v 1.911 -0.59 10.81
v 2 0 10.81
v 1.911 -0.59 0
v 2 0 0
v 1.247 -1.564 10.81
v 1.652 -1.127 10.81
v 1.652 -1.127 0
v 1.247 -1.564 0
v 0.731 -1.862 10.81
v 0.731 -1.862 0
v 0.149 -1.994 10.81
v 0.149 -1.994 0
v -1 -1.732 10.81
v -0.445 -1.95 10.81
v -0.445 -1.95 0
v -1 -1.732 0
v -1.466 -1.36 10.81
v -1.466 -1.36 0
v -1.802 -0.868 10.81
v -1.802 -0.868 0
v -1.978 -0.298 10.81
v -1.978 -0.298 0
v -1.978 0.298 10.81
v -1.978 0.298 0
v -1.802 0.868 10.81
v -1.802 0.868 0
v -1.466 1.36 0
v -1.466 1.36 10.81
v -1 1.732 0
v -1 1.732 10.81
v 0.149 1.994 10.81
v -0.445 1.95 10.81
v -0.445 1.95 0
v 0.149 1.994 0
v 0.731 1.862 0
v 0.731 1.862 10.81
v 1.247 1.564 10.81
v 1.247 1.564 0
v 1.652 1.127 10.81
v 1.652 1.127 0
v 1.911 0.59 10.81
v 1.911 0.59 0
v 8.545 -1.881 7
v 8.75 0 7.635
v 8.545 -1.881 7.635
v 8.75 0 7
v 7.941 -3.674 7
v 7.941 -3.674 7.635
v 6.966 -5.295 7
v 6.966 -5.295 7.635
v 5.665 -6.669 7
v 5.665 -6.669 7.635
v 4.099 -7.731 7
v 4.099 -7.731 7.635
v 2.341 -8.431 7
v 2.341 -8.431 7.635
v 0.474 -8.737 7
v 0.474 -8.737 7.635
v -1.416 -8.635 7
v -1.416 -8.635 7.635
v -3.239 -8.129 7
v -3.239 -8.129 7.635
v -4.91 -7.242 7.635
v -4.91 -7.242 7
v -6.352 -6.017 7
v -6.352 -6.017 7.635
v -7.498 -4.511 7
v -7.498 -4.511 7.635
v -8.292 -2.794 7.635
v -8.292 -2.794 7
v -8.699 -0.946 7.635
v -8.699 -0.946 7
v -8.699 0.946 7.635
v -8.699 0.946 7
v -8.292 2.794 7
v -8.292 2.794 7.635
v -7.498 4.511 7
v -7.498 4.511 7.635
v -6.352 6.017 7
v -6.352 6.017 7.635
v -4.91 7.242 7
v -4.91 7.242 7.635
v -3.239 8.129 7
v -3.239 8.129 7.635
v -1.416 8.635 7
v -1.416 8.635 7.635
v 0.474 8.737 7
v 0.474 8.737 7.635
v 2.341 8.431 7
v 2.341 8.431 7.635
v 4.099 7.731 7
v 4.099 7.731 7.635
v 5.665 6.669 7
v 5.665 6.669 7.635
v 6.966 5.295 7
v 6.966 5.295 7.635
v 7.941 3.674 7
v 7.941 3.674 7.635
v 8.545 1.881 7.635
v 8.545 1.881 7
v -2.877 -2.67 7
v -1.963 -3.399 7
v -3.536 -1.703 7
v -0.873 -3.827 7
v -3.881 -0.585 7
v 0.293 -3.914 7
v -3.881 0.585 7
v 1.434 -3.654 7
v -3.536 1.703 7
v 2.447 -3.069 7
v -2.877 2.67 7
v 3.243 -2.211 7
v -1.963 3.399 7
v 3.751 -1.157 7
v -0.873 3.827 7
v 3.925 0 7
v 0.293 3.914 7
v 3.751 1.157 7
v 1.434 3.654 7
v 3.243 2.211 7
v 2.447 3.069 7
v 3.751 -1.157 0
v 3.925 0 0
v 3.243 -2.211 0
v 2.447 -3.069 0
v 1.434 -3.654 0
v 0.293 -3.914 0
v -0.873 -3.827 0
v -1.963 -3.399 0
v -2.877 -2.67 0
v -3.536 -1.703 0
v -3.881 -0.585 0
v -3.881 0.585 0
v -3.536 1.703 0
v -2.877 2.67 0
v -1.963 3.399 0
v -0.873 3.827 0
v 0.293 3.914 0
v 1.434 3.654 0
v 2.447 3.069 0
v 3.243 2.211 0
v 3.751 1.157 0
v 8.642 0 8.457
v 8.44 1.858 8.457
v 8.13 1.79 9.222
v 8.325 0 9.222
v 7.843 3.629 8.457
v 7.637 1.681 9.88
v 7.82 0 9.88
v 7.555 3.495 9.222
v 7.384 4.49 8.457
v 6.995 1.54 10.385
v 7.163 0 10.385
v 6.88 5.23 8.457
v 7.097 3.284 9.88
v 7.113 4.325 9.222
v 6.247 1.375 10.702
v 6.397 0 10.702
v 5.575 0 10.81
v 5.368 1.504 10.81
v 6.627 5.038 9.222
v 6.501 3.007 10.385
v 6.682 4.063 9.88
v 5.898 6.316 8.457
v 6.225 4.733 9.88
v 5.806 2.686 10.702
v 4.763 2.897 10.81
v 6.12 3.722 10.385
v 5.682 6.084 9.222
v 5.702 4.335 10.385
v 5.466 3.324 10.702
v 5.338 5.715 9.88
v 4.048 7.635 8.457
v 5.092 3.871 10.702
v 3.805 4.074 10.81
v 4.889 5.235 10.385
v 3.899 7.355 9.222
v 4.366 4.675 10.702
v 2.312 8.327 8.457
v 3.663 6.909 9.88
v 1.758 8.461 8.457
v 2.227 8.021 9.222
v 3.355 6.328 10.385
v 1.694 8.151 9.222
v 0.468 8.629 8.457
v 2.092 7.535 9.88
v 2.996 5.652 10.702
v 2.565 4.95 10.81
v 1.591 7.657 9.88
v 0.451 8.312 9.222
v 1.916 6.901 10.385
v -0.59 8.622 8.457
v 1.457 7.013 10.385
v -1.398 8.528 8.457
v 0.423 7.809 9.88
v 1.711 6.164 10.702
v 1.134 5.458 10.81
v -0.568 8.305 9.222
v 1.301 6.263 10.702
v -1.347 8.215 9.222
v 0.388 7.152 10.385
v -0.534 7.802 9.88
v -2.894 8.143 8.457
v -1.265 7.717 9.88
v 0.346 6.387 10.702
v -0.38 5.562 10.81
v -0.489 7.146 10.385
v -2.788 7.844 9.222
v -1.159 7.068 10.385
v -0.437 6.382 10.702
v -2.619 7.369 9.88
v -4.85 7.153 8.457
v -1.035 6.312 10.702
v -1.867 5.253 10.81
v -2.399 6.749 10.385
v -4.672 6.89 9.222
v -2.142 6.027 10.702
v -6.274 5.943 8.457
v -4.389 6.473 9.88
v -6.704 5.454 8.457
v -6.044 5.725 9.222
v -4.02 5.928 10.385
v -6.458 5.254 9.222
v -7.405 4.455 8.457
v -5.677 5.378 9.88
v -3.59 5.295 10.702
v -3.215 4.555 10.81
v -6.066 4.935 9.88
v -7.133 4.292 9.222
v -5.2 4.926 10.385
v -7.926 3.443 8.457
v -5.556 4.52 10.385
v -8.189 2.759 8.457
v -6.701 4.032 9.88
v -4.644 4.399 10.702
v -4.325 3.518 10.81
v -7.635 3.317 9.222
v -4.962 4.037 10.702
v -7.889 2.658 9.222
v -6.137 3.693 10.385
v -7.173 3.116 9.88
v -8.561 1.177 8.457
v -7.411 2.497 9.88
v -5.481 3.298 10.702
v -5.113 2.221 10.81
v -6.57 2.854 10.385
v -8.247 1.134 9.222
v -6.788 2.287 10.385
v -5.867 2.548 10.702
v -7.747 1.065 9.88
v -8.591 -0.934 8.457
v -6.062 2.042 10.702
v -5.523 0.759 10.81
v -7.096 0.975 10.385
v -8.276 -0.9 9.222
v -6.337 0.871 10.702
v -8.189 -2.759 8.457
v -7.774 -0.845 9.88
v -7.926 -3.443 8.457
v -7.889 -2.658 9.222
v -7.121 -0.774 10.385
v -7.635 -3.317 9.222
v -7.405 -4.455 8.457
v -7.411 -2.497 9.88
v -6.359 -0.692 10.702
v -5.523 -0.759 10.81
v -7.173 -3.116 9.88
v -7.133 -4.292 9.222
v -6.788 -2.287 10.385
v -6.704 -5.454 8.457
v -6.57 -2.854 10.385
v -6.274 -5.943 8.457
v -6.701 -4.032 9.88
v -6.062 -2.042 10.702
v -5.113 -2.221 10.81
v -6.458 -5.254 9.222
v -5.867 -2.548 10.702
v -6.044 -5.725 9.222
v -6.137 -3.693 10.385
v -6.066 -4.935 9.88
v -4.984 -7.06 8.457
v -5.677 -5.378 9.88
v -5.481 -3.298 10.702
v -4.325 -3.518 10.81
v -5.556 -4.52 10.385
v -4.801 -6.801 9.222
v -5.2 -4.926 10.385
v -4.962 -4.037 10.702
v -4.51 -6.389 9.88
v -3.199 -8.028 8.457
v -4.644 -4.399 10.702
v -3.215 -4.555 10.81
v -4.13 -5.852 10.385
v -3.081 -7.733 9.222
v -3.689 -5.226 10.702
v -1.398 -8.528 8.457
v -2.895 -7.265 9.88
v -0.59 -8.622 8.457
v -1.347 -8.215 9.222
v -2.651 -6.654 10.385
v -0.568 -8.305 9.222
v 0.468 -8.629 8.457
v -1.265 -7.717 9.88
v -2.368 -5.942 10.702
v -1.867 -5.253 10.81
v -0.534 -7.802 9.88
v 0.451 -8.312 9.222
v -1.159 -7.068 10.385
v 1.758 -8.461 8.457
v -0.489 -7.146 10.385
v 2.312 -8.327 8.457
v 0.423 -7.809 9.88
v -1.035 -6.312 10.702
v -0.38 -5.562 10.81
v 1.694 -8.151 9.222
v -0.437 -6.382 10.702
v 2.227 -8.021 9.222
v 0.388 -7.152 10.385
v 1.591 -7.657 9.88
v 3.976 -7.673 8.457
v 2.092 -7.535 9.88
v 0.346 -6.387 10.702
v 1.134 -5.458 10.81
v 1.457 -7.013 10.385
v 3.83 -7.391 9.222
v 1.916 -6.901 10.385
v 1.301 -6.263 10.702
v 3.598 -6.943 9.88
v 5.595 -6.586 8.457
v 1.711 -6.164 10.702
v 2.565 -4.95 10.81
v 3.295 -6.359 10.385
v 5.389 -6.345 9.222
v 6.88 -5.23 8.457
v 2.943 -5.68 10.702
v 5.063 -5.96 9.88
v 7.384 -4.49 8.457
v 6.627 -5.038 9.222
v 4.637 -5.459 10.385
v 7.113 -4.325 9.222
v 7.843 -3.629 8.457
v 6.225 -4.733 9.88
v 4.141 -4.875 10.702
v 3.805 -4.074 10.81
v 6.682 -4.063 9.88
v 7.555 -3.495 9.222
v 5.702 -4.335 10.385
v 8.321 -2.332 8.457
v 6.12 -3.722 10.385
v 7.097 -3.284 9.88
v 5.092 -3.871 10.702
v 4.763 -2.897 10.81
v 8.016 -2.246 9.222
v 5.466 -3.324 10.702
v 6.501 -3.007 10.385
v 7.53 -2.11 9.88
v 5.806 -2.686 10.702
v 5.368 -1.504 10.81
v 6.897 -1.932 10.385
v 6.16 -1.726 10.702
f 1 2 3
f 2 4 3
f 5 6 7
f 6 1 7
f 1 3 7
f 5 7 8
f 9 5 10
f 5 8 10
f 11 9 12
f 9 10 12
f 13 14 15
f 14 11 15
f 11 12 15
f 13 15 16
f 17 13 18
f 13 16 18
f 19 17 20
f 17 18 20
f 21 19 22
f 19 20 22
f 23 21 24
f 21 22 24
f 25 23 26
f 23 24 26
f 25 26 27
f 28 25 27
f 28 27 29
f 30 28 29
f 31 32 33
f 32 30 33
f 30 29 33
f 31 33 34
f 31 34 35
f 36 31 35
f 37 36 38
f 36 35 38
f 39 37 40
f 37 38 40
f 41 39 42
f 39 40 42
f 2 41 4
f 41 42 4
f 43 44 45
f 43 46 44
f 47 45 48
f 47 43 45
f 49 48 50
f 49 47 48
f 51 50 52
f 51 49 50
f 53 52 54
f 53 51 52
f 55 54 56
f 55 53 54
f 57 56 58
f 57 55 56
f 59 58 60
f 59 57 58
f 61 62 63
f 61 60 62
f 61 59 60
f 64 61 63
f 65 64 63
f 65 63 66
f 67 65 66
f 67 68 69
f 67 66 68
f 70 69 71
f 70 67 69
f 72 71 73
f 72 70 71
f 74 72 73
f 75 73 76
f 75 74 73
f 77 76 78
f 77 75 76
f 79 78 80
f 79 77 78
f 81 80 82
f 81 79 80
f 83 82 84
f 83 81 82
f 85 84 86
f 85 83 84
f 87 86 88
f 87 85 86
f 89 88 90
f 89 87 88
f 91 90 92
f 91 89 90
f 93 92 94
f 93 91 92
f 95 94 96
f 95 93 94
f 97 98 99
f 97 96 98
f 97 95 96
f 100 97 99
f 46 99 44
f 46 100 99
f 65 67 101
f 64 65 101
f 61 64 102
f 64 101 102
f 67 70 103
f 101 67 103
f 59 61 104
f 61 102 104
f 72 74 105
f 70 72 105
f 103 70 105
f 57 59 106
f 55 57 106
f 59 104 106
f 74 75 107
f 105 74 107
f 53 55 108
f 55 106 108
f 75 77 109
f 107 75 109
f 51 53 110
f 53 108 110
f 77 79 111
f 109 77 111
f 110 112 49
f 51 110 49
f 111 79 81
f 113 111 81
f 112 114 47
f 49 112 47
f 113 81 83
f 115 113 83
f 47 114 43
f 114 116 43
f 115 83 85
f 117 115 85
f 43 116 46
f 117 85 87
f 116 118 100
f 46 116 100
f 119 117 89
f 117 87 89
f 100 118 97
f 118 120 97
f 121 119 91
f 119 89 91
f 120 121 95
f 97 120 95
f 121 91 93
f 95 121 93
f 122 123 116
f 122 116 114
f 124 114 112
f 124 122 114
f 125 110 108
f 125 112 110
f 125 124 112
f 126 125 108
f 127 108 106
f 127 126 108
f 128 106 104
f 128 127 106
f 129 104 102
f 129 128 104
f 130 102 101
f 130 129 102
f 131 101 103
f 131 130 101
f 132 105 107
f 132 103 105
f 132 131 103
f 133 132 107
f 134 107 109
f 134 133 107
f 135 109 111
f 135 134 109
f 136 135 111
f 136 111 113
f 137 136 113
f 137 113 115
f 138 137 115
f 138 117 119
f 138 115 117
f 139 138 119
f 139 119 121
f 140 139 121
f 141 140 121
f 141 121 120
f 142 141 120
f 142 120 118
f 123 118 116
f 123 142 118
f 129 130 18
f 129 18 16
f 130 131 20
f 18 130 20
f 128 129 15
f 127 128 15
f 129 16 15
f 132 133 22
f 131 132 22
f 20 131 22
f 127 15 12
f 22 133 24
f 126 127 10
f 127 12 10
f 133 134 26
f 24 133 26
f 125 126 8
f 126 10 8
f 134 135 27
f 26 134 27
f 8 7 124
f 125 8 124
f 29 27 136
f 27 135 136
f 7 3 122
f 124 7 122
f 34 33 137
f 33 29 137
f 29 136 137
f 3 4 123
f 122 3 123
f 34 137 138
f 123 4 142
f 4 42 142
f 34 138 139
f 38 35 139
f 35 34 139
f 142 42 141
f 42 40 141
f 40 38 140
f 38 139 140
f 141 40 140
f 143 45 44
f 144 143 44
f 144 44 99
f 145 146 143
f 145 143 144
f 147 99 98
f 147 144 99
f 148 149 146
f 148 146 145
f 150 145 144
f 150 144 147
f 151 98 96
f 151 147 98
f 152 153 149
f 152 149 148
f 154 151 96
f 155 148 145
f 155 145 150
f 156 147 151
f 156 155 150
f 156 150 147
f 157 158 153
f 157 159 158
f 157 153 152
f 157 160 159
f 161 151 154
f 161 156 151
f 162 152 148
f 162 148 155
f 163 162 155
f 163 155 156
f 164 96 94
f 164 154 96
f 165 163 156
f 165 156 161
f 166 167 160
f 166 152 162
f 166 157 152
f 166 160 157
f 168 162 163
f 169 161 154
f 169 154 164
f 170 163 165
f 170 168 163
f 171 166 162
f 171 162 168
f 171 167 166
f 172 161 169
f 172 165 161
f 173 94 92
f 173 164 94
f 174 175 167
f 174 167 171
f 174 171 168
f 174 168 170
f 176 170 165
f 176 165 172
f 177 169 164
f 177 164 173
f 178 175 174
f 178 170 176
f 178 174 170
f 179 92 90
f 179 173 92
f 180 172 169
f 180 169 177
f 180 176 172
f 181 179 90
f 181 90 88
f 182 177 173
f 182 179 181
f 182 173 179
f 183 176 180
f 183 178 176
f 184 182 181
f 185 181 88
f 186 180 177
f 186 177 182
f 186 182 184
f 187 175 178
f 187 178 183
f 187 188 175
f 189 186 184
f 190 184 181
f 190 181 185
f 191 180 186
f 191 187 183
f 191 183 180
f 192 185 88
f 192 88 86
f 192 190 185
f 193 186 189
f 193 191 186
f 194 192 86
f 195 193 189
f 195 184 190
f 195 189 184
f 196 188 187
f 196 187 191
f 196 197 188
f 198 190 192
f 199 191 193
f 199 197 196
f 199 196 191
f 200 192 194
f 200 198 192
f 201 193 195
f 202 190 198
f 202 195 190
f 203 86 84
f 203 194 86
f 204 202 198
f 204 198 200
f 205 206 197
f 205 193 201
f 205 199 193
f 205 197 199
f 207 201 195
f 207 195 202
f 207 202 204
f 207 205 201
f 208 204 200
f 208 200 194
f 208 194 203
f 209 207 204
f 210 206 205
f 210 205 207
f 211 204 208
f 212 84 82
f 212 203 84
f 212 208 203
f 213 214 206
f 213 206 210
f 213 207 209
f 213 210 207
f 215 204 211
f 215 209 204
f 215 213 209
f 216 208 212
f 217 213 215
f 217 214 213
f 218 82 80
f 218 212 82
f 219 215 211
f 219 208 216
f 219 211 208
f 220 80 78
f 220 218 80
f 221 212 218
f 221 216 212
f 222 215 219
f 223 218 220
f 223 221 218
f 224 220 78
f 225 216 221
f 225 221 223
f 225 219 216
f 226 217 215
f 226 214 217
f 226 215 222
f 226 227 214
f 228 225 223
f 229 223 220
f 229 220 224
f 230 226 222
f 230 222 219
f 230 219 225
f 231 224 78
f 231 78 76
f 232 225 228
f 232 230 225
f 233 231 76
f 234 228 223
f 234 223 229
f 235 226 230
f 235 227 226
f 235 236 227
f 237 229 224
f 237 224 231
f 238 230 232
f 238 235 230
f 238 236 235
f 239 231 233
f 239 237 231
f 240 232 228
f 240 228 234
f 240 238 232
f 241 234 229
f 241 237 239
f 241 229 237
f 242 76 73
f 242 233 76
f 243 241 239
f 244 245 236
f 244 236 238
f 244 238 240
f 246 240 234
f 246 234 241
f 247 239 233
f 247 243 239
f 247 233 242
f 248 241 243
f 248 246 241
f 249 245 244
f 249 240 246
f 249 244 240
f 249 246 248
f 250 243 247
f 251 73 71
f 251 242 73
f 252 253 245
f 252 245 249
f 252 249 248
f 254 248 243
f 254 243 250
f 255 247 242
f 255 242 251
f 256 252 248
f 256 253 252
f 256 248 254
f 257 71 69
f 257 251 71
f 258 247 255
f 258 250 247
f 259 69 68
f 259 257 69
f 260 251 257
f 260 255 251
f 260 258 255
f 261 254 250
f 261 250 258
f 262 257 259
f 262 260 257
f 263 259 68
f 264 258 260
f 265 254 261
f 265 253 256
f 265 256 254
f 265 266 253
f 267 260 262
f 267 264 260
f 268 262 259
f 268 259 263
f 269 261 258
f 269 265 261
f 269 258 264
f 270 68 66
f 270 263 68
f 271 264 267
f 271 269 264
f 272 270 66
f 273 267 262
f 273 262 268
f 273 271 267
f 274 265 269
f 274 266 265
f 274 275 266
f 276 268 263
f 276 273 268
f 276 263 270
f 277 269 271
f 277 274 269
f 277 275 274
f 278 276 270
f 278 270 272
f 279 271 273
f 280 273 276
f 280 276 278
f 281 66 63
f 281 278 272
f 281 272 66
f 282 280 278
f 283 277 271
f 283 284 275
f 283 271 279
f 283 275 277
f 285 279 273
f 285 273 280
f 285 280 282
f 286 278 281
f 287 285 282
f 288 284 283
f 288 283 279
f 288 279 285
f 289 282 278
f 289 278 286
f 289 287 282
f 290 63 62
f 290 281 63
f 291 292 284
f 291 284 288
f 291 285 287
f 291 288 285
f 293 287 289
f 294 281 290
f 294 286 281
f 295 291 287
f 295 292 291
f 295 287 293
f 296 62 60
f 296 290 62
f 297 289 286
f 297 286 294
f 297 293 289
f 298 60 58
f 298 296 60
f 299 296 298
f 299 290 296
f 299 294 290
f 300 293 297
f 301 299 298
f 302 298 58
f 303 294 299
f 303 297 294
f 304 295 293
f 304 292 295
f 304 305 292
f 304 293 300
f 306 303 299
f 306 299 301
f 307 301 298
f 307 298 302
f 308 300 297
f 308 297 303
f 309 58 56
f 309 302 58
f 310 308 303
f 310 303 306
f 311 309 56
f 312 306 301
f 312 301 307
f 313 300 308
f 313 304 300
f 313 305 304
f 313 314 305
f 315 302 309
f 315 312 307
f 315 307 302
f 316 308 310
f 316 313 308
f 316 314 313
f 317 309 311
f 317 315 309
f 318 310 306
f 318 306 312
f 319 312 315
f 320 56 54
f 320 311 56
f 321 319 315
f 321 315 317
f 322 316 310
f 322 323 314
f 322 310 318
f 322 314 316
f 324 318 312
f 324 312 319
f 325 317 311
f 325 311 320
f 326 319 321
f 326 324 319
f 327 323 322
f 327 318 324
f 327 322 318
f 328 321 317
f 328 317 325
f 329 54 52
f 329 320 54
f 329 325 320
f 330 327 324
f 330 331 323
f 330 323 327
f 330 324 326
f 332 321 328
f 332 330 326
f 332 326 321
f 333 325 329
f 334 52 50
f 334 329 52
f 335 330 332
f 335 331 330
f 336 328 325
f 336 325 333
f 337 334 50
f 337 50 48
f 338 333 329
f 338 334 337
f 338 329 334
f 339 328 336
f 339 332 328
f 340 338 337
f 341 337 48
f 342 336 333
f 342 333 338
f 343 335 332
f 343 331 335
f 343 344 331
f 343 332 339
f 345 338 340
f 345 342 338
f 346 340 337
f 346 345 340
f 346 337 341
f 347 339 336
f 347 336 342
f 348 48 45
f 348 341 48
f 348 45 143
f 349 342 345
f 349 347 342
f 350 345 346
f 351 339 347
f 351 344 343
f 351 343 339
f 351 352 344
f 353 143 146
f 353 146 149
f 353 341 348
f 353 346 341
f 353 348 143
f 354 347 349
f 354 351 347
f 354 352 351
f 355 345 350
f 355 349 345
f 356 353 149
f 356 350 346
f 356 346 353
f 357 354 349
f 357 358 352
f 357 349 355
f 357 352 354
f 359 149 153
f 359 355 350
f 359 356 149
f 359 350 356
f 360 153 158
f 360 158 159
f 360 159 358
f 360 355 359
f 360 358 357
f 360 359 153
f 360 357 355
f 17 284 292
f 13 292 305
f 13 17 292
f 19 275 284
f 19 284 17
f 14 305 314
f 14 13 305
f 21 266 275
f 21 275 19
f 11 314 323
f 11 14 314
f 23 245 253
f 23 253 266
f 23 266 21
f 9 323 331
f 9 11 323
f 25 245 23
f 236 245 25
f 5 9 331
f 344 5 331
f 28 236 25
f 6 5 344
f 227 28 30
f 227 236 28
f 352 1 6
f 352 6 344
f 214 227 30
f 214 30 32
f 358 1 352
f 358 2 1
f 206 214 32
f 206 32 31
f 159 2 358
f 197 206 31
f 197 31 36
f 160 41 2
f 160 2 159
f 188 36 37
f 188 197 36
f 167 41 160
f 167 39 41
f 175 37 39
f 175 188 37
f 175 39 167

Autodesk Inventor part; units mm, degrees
ref_plane "YZ Plane" through (0, 0, 0) normal (1, 0, 0) x (0, 1, 0)
ref_plane "XZ Plane" through (0, 0, 0) normal (0, 1, 0) x (-1, 0, 0)
ref_plane "XY Plane" through (0, 0, 0) normal (0, 0, 1) x (1, 0, 0)
sketch "Sketch1" plane through (0, 0, 0) normal (0, 0, 1) x (1, 0, 0)
  circle A0 centre (0, 0) radius 3.925
  circle A1 centre (0, 0) radius 2
  dimension "d0" = 7.85
  dimension "d1" = 4
extrude "Extrusion1" add sketch "Sketch1" along normal blind 7
sketch "Sketch2" plane through (0, 0, 7) normal (0, 0, 1) x (1, 0, 0)
  circle A0 centre (0, 0) radius 8.75
  circle A1 centre (0, 0) radius 2 projected
  dimension "d4" = 17.5
extrude "Extrusion2" add sketch "Sketch2" along normal blind 3.81
fillet "Fillet1" radius 3.175 1 edges at (-8.75, 0, 10.81)
properties part number "ball bearing connector"
